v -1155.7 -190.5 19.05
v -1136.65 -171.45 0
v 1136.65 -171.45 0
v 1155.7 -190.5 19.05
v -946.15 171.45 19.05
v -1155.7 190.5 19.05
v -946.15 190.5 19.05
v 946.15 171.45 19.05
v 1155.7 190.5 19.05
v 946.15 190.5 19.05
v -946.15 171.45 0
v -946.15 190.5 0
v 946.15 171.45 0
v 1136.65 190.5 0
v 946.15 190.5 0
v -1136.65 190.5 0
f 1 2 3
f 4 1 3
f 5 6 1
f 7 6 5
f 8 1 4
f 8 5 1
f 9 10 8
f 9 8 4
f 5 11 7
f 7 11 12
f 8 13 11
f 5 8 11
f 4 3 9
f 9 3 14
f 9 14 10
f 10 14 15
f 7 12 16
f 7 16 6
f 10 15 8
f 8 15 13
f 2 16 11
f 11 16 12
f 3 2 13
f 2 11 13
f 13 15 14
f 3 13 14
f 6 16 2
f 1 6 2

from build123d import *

# Parameters (mm, degrees)
F1_DEPTH = 19.05
F2_SIZE  = 19.04999


# Not quite as in the source:
# - a fillet or chamfer is up to 0.001 mm smaller than in the source, because OpenCascade refuses the exact size


with BuildPart() as f1:
    # F0 (on Top) → F1 (new body)
    with BuildSketch(Plane.XY):
        Polygon((-1155.7, -190.5), (1155.7, -190.5), (1155.7, 190.5), (946.15, 190.5), (946.15, 171.45), (-946.15, 171.45), (-946.15, 190.5), (-1155.7, 190.5), align=None)
    extrude(amount=F1_DEPTH)

    # F2 (size 19.05 in the source; OpenCascade refuses exactly that, so slightly less here)
    f2_edges = [f1.edges().sort_by_distance(p)[0] for p in [
        (-1155.7, 0, 0),
        (0, -190.5, 0),
        (1155.7, 0, 0),
    ]]
    chamfer(f2_edges, length=F2_SIZE)


solid = f1.part
